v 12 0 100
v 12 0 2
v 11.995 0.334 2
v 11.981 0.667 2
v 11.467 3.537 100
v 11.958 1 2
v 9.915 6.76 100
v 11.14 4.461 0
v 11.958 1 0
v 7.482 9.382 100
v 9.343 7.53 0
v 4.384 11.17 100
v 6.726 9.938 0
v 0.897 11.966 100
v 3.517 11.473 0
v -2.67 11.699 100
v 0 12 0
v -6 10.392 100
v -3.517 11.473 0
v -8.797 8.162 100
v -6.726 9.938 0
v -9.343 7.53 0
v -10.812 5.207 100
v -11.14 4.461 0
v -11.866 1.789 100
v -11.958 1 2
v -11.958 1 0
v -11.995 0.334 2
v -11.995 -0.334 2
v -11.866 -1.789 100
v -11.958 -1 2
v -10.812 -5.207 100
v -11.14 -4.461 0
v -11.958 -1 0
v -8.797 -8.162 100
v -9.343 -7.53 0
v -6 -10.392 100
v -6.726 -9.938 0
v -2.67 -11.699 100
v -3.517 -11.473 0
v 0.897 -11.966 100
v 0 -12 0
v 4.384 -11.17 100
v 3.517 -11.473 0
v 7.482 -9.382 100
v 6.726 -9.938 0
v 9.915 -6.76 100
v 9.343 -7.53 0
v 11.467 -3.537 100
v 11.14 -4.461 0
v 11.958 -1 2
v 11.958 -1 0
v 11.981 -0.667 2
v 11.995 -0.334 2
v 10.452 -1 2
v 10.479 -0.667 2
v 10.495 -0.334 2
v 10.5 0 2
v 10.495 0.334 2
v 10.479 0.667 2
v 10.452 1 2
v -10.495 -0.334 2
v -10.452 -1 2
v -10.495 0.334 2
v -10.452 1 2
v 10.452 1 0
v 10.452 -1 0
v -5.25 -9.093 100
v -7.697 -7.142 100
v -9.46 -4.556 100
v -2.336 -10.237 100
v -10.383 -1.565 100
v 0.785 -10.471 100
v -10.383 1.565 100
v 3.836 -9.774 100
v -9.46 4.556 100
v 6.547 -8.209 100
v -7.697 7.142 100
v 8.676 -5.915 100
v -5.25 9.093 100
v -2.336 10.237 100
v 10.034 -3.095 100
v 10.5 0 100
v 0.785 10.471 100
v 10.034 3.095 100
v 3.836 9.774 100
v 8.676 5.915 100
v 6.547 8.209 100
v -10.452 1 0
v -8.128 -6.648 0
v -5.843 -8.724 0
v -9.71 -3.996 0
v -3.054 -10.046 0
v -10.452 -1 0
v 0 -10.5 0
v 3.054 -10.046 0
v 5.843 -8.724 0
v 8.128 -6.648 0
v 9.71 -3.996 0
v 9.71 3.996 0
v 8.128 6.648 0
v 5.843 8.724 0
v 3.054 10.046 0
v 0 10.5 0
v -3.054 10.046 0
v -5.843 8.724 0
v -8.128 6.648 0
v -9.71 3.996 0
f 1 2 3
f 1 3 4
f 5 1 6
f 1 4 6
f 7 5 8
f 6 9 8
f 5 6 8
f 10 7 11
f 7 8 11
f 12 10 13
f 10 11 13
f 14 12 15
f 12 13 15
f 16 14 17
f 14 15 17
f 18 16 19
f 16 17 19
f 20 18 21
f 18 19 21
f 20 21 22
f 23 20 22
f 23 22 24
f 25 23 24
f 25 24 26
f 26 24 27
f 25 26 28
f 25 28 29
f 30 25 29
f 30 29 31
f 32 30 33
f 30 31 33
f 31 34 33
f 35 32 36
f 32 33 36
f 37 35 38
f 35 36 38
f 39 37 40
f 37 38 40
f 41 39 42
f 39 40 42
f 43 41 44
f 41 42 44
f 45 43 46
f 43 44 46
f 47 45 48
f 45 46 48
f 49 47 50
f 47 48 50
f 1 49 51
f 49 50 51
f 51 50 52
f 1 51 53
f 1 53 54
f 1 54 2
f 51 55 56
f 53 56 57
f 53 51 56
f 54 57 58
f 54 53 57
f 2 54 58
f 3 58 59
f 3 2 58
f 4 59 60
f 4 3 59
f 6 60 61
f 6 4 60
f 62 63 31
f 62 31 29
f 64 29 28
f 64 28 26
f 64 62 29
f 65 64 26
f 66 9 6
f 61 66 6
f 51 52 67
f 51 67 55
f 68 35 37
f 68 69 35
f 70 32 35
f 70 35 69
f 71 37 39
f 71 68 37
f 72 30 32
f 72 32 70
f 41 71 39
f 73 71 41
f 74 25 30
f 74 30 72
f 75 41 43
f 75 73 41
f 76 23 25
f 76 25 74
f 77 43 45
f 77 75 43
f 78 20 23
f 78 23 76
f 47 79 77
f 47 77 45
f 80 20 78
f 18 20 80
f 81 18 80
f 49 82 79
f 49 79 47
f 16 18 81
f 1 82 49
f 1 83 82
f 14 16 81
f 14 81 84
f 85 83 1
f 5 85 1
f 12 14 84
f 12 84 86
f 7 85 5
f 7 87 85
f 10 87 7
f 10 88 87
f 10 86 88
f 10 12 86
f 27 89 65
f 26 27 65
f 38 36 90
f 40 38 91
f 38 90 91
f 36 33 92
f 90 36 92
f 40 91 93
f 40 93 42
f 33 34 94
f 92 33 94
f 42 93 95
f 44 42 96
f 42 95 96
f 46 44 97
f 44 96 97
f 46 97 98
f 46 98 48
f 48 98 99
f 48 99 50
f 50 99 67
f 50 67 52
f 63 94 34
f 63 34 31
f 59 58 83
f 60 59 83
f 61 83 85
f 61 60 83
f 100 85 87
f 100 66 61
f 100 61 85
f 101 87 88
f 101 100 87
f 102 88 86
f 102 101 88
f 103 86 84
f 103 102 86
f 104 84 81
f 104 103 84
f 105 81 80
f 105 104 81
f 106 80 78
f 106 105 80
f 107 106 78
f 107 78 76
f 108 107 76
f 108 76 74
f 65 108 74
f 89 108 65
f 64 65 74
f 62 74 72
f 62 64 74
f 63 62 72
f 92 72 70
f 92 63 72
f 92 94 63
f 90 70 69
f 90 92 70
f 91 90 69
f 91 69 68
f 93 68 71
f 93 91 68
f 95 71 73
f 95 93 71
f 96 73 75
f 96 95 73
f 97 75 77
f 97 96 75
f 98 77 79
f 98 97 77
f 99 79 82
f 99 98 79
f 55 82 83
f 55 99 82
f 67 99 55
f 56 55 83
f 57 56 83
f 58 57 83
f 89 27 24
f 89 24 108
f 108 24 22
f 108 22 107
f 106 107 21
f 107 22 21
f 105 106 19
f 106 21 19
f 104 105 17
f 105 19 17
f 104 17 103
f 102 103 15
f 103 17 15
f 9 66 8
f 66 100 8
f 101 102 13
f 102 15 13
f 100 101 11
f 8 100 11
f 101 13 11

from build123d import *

# Parameters (mm, degrees)
F0_R     = 12
F0_R_2   = 10.5
F1_DEPTH = 100
F2_W     = 2
F2_H     = 2
F3_DEPTH = 15.56


with BuildPart() as f1:
    # F0 (on Top) → F1 (new body)
    with BuildSketch(Plane.XY):
        Circle(F0_R)
        Circle(F0_R_2, mode=Mode.SUBTRACT)
    extrude(amount=F1_DEPTH)

    # F2 (on Right) → F3 (cut, symmetric)
    with BuildSketch(Plane.YZ):
        with Locations((0, 1)):
            Rectangle(F2_W, F2_H)
    extrude(amount=F3_DEPTH, both=True, mode=Mode.SUBTRACT)


solid = f1.part
